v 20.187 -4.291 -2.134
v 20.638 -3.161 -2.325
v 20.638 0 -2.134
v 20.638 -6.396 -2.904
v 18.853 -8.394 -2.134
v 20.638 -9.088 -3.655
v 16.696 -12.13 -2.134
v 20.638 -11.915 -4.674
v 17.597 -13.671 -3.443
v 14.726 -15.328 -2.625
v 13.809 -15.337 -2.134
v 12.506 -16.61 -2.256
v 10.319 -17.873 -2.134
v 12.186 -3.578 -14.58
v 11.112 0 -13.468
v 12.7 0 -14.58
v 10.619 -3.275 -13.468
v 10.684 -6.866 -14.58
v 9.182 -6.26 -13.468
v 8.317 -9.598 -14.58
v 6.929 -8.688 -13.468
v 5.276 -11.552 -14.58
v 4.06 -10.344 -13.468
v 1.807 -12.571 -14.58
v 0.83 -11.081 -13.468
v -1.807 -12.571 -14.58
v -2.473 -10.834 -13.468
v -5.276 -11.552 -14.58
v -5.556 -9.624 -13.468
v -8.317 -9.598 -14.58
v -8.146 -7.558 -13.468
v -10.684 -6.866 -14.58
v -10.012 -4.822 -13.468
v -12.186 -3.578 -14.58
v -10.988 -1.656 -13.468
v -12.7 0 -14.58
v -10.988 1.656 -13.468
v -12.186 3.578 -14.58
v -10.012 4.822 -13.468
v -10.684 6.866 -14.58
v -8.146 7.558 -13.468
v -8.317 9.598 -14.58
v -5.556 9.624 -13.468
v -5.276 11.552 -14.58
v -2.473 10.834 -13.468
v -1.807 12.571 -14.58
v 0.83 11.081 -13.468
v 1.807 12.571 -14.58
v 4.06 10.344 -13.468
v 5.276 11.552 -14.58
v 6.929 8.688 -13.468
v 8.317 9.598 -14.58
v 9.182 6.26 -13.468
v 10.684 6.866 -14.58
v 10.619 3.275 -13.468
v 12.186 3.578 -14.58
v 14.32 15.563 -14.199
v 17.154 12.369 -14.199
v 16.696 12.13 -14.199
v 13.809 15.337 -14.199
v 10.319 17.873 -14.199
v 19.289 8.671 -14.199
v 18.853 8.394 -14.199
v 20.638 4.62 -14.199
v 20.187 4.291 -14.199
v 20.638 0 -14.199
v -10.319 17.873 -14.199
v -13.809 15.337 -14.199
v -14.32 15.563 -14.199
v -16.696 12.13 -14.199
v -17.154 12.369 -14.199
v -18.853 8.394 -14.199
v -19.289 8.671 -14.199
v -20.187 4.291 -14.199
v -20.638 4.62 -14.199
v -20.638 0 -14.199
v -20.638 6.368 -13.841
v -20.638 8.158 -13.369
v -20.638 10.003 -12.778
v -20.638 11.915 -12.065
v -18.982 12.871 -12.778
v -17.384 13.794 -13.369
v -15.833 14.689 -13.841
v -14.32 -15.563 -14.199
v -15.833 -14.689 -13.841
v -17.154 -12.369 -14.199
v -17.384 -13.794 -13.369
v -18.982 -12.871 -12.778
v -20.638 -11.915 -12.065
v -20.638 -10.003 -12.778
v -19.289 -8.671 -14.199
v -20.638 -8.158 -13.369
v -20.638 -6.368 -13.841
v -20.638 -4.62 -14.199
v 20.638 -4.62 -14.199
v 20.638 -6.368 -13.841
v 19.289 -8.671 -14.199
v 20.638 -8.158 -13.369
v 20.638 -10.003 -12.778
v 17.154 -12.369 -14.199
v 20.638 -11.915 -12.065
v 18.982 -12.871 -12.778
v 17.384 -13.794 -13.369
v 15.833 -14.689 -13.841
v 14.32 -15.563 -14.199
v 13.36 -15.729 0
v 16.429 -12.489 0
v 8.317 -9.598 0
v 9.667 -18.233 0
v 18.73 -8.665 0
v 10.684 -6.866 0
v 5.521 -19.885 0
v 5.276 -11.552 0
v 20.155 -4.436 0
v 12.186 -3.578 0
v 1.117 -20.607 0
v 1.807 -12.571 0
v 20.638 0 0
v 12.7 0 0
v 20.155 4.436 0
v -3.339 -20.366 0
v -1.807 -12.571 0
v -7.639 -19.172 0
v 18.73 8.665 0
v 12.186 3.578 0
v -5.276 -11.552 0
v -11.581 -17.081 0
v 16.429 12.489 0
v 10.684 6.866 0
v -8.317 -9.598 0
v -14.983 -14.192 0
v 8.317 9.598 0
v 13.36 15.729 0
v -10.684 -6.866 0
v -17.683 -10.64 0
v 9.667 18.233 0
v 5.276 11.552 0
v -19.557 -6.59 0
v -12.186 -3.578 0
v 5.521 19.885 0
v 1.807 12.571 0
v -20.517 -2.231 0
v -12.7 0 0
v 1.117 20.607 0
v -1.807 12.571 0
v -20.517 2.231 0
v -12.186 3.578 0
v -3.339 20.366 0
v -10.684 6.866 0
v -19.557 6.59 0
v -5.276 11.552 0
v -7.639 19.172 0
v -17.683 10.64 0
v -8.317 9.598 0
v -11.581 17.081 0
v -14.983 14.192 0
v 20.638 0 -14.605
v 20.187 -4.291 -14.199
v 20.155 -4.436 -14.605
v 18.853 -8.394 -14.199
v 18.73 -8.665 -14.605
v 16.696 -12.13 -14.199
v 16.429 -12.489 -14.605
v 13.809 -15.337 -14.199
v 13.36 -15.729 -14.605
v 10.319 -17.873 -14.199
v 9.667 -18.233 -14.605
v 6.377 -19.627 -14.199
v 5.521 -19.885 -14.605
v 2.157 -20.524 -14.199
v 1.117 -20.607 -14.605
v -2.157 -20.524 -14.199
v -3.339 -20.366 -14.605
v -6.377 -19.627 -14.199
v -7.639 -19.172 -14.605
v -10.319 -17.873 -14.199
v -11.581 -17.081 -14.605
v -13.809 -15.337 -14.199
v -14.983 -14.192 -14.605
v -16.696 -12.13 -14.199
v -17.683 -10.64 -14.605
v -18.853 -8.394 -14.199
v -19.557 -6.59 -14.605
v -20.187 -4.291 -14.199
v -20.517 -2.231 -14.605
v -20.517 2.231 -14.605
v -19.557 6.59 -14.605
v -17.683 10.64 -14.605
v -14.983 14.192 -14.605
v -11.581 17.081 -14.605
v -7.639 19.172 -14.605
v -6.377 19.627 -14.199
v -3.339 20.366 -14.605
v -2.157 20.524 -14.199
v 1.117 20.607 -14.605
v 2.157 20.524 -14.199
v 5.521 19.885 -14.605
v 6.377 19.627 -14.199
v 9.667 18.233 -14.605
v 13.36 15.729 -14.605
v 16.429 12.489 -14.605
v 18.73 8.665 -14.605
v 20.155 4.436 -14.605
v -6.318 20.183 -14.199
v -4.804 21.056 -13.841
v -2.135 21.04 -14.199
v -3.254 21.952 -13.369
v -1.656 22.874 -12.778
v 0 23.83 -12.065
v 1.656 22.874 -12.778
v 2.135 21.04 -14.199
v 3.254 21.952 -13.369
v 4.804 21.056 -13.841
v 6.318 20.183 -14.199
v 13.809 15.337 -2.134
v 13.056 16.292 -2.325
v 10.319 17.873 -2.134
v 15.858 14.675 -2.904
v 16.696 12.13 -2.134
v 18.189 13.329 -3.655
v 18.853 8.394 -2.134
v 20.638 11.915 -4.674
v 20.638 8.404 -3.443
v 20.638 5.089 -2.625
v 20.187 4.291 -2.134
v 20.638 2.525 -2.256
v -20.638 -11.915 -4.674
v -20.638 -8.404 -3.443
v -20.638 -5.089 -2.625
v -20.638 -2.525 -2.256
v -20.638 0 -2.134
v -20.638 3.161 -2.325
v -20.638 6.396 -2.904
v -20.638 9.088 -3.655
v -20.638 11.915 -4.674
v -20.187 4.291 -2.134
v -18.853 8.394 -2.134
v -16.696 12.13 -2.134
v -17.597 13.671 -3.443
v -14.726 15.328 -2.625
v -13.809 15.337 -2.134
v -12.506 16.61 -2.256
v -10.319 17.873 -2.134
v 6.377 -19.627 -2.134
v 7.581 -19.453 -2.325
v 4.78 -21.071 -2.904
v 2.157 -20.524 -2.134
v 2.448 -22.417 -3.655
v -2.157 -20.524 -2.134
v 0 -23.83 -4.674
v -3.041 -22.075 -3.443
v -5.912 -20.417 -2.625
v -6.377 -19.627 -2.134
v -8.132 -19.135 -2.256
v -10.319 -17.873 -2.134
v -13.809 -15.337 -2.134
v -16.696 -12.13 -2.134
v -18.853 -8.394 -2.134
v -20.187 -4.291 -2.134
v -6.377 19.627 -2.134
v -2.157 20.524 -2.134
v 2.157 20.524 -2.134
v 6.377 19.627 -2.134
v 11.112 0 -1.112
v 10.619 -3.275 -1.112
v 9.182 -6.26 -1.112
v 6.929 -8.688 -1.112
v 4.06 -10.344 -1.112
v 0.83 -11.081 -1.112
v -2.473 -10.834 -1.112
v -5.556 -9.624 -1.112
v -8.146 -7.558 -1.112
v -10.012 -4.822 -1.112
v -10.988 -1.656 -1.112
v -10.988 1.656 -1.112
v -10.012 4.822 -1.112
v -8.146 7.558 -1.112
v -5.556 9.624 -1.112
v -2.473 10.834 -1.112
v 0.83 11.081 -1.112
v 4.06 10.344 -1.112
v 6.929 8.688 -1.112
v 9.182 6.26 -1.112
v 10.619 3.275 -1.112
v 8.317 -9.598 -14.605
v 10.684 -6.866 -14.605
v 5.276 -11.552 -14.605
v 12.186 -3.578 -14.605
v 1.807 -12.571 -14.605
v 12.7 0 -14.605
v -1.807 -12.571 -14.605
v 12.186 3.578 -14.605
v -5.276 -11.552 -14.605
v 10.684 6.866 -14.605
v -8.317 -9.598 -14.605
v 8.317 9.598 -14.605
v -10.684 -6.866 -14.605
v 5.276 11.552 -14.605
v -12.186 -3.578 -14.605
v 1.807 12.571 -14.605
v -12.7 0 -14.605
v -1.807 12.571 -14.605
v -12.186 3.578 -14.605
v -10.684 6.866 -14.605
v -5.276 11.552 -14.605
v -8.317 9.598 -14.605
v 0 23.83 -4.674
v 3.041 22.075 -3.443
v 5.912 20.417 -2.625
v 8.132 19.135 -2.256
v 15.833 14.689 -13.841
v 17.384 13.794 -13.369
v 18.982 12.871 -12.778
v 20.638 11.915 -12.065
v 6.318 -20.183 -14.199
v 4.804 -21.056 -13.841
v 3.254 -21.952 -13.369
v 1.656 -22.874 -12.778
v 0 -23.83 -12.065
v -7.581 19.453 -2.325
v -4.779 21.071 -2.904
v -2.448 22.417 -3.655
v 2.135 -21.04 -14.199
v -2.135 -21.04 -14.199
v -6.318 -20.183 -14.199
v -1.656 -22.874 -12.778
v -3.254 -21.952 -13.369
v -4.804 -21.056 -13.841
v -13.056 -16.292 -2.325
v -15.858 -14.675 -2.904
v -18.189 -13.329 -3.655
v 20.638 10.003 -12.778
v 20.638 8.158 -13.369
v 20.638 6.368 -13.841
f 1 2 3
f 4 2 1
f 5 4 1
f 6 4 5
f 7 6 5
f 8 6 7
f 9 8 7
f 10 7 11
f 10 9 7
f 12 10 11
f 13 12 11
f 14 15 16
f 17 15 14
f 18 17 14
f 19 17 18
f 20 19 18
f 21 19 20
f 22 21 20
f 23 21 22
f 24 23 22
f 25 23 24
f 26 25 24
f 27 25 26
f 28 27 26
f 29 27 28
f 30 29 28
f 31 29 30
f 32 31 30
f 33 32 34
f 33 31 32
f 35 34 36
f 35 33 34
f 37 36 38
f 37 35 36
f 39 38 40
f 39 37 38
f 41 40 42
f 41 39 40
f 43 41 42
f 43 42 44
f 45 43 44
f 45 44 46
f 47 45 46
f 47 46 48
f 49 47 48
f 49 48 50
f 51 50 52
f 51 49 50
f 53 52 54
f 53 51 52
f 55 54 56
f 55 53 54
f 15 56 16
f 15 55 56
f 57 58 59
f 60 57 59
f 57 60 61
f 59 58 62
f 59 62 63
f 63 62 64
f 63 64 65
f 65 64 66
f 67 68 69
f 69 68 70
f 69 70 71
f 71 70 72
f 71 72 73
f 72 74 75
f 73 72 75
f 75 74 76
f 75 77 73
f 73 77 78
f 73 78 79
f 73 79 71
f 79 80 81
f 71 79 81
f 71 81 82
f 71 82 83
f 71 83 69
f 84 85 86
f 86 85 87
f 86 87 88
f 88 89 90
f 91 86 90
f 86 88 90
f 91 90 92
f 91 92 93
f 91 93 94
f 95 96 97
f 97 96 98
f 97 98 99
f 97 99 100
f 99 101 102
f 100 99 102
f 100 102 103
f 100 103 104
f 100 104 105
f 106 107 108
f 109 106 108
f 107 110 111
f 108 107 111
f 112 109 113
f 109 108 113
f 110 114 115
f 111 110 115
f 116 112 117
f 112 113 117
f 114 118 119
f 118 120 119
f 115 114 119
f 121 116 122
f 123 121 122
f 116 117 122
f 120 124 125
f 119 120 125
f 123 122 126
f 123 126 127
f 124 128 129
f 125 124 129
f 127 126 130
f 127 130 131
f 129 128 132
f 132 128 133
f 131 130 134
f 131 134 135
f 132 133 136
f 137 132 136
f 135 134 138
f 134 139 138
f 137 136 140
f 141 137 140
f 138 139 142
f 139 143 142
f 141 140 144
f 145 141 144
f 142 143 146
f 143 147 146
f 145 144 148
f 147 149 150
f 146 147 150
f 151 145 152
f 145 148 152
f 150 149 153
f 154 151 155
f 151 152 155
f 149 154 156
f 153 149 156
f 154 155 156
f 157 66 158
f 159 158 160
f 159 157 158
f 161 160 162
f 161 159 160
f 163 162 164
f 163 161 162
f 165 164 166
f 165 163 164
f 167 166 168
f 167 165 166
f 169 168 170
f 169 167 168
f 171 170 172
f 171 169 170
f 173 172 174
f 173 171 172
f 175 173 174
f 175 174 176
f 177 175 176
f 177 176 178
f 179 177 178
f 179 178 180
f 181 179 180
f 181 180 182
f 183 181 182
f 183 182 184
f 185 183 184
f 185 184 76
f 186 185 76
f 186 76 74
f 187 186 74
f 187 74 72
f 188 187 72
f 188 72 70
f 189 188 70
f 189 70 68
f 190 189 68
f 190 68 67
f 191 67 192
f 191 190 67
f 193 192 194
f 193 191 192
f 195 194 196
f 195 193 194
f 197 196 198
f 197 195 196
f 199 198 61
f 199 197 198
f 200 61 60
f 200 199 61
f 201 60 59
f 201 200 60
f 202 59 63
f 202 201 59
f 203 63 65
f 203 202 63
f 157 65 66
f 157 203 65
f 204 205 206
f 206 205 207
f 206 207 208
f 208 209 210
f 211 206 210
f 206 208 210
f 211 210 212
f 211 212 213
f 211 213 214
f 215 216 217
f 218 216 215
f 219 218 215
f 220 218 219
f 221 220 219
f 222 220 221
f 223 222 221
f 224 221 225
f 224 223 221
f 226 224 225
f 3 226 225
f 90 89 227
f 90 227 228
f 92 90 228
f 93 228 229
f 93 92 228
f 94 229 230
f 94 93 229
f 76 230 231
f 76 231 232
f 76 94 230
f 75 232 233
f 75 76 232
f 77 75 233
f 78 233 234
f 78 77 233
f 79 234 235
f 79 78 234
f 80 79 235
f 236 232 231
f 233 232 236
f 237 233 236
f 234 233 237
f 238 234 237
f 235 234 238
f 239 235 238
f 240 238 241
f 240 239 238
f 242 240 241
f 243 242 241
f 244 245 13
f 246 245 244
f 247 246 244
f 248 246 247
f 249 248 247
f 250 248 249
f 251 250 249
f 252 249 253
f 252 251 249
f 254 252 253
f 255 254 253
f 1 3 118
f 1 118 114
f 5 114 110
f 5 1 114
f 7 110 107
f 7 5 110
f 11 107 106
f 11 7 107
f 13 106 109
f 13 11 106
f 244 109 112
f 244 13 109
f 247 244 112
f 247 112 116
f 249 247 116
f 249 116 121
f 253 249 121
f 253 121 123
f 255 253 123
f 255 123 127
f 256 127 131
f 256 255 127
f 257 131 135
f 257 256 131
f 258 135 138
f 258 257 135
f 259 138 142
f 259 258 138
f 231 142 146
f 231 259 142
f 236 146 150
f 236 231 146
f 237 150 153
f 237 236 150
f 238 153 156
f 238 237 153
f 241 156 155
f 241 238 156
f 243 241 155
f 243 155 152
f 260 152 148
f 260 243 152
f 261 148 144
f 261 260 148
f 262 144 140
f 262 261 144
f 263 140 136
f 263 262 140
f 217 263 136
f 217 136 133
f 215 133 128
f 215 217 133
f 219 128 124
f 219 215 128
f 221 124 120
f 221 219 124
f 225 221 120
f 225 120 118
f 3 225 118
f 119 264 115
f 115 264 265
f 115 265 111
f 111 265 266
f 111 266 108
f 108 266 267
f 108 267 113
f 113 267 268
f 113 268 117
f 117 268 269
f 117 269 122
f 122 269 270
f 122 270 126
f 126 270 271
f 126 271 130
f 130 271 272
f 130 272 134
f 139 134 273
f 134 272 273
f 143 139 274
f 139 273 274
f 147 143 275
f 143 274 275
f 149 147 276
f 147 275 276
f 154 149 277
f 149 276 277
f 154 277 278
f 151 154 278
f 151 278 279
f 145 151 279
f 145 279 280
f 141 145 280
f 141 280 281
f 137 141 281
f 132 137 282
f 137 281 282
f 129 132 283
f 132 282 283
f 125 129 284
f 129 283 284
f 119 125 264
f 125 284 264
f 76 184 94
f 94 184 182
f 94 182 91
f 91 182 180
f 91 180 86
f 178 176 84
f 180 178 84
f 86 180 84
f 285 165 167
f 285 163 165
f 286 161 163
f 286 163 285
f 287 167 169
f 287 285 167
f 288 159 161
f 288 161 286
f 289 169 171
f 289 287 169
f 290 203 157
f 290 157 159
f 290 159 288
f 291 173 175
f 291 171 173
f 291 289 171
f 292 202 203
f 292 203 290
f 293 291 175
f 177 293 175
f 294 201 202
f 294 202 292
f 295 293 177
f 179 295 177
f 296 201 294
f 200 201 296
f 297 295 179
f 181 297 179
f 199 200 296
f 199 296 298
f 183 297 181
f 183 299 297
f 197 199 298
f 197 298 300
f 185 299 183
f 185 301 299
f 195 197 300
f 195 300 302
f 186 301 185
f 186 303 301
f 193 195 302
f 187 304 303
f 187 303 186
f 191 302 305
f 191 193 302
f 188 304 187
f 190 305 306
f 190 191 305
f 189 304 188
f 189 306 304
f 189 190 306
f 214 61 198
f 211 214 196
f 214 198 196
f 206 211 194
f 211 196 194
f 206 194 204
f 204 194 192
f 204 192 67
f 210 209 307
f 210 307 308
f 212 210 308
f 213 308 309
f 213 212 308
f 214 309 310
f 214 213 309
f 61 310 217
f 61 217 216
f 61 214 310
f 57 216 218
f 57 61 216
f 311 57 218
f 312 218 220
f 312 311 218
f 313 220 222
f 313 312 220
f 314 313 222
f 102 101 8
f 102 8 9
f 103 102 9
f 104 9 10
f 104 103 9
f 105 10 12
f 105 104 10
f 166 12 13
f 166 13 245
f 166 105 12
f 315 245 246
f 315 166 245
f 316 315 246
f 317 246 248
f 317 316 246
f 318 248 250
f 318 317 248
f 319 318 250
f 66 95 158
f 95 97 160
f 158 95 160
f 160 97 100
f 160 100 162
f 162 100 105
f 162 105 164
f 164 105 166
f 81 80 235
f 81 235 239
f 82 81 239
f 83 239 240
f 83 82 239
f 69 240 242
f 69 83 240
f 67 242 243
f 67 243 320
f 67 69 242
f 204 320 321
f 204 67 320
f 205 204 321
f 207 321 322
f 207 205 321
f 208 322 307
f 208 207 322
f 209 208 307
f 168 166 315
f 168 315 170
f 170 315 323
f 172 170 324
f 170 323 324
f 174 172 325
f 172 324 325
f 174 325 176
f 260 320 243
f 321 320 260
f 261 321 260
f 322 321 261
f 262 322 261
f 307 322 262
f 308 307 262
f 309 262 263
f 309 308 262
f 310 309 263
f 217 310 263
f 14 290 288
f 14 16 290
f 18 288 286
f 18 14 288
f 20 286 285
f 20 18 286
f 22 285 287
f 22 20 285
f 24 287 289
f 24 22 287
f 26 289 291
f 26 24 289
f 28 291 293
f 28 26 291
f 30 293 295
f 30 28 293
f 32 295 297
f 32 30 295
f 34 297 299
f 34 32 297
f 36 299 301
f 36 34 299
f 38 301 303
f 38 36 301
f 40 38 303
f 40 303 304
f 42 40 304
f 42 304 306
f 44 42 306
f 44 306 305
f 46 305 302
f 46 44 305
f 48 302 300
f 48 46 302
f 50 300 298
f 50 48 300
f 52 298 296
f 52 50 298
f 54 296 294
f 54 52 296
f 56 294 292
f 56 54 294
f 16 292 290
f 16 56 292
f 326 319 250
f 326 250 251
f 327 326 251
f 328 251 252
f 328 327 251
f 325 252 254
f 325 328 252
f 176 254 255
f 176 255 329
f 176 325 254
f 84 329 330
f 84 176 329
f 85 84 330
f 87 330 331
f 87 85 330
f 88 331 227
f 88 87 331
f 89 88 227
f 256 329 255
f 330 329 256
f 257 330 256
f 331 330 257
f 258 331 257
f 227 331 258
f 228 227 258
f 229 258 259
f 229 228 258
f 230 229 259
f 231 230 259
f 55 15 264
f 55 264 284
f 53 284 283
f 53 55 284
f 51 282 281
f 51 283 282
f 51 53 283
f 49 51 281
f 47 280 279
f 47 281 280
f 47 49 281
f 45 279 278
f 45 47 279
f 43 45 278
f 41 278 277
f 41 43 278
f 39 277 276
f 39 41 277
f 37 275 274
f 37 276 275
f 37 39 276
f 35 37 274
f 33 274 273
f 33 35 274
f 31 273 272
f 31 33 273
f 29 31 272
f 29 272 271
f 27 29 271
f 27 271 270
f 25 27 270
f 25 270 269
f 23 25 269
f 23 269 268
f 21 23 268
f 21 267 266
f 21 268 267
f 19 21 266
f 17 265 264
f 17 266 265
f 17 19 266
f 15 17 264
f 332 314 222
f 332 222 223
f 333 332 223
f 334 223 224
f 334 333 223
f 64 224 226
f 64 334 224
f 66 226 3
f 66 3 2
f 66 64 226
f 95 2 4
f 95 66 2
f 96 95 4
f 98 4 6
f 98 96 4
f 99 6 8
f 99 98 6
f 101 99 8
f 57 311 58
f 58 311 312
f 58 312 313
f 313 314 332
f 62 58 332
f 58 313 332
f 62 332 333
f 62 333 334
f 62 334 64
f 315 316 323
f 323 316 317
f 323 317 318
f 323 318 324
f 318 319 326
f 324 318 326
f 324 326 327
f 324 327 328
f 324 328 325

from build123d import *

# Parameters (mm, degrees)
BASENUT_START = -14.605
BASENUTSKE_R  = 11.1125
BASENUT_DEPTH = 14.605
SKETCH4_W     = 0.4064
SKETCH4_H     = 15.892632361


with BuildPart() as part:
    # BaseNutSke → BaseNut (new body)
    with BuildSketch(Plane.XY.offset(BASENUT_START)):
        Polygon((20.6375, 11.91506618), (20.6375, -11.91506618), (0, -23.830132361), (-20.6375, -11.91506618), (-20.6375, 11.91506618), (0, 23.830132361), align=None)
        Circle(BASENUTSKE_R, mode=Mode.SUBTRACT)
    extrude(amount=BASENUT_DEPTH)

    # Sketch4 → Bearing-Face (revolve, cut)
    with BuildSketch(Plane(origin=(0, 0, 0), x_dir=(0, 0, -1), z_dir=(1, 0, 0)), mode=Mode.PRIVATE) as bearing_face_sk:
        with Locations((14.4018, 28.583816181)):
            Rectangle(SKETCH4_W, SKETCH4_H)
        Polygon((0, 20.6375), (-12.7, 20.6375), (-12.7, 36.530132361), (2.54, 36.530132361), (2.54, 23.830132361), align=None)
    revolve(bearing_face_sk.sketch.rotate(Axis((0, 0, 0), (0, 0, -1)), 90), axis=Axis((0, 0, 0), (0, 0, -1)), mode=Mode.SUBTRACT)

    # Sketch3 → Double-Chamfer (revolve, cut)
    with BuildSketch(Plane(origin=(0, 0, 0), x_dir=(0, 0, -1), z_dir=(1, 0, 0)), mode=Mode.PRIVATE) as double_chamfer_sk:
        Polygon((14.605, 20.6375), (12.065, 23.830132361), (12.065, 36.530132361), (27.305, 36.530132361), (27.305, 20.6375), align=None)
        Polygon((4.6736, 36.530132361), (-10.5664, 36.530132361), (-10.5664, 20.6375), (2.1336, 20.6375), (4.6736, 23.830132361), align=None)
    revolve(double_chamfer_sk.sketch.rotate(Axis((0, 0, 0), (0, 0, -1)), 90), axis=Axis((0, 0, 0), (0, 0, -1)), mode=Mode.SUBTRACT)

    # EndChamferSke → EndChamfer (revolve, cut)
    with BuildSketch(Plane(origin=(0, 0, 0), x_dir=(0, 0, -1), z_dir=(1, 0, 0)), mode=Mode.PRIVATE) as endchamfer_sk:
        Polygon((14.5796, 12.7), (13.356862586, 10.95375), (14.6304, 10.95375), (14.6304, 12.7), align=None)
        Polygon((-0.0508, 12.7), (0, 12.7), (1.222737414, 10.95375), (-0.0508, 10.95375), align=None)
    revolve(endchamfer_sk.sketch.rotate(Axis((0, 0, -25.037505729), (0, 0, -1)), 90), axis=Axis((0, 0, -25.037505729), (0, 0, -1)), mode=Mode.SUBTRACT)


solid = part.part
